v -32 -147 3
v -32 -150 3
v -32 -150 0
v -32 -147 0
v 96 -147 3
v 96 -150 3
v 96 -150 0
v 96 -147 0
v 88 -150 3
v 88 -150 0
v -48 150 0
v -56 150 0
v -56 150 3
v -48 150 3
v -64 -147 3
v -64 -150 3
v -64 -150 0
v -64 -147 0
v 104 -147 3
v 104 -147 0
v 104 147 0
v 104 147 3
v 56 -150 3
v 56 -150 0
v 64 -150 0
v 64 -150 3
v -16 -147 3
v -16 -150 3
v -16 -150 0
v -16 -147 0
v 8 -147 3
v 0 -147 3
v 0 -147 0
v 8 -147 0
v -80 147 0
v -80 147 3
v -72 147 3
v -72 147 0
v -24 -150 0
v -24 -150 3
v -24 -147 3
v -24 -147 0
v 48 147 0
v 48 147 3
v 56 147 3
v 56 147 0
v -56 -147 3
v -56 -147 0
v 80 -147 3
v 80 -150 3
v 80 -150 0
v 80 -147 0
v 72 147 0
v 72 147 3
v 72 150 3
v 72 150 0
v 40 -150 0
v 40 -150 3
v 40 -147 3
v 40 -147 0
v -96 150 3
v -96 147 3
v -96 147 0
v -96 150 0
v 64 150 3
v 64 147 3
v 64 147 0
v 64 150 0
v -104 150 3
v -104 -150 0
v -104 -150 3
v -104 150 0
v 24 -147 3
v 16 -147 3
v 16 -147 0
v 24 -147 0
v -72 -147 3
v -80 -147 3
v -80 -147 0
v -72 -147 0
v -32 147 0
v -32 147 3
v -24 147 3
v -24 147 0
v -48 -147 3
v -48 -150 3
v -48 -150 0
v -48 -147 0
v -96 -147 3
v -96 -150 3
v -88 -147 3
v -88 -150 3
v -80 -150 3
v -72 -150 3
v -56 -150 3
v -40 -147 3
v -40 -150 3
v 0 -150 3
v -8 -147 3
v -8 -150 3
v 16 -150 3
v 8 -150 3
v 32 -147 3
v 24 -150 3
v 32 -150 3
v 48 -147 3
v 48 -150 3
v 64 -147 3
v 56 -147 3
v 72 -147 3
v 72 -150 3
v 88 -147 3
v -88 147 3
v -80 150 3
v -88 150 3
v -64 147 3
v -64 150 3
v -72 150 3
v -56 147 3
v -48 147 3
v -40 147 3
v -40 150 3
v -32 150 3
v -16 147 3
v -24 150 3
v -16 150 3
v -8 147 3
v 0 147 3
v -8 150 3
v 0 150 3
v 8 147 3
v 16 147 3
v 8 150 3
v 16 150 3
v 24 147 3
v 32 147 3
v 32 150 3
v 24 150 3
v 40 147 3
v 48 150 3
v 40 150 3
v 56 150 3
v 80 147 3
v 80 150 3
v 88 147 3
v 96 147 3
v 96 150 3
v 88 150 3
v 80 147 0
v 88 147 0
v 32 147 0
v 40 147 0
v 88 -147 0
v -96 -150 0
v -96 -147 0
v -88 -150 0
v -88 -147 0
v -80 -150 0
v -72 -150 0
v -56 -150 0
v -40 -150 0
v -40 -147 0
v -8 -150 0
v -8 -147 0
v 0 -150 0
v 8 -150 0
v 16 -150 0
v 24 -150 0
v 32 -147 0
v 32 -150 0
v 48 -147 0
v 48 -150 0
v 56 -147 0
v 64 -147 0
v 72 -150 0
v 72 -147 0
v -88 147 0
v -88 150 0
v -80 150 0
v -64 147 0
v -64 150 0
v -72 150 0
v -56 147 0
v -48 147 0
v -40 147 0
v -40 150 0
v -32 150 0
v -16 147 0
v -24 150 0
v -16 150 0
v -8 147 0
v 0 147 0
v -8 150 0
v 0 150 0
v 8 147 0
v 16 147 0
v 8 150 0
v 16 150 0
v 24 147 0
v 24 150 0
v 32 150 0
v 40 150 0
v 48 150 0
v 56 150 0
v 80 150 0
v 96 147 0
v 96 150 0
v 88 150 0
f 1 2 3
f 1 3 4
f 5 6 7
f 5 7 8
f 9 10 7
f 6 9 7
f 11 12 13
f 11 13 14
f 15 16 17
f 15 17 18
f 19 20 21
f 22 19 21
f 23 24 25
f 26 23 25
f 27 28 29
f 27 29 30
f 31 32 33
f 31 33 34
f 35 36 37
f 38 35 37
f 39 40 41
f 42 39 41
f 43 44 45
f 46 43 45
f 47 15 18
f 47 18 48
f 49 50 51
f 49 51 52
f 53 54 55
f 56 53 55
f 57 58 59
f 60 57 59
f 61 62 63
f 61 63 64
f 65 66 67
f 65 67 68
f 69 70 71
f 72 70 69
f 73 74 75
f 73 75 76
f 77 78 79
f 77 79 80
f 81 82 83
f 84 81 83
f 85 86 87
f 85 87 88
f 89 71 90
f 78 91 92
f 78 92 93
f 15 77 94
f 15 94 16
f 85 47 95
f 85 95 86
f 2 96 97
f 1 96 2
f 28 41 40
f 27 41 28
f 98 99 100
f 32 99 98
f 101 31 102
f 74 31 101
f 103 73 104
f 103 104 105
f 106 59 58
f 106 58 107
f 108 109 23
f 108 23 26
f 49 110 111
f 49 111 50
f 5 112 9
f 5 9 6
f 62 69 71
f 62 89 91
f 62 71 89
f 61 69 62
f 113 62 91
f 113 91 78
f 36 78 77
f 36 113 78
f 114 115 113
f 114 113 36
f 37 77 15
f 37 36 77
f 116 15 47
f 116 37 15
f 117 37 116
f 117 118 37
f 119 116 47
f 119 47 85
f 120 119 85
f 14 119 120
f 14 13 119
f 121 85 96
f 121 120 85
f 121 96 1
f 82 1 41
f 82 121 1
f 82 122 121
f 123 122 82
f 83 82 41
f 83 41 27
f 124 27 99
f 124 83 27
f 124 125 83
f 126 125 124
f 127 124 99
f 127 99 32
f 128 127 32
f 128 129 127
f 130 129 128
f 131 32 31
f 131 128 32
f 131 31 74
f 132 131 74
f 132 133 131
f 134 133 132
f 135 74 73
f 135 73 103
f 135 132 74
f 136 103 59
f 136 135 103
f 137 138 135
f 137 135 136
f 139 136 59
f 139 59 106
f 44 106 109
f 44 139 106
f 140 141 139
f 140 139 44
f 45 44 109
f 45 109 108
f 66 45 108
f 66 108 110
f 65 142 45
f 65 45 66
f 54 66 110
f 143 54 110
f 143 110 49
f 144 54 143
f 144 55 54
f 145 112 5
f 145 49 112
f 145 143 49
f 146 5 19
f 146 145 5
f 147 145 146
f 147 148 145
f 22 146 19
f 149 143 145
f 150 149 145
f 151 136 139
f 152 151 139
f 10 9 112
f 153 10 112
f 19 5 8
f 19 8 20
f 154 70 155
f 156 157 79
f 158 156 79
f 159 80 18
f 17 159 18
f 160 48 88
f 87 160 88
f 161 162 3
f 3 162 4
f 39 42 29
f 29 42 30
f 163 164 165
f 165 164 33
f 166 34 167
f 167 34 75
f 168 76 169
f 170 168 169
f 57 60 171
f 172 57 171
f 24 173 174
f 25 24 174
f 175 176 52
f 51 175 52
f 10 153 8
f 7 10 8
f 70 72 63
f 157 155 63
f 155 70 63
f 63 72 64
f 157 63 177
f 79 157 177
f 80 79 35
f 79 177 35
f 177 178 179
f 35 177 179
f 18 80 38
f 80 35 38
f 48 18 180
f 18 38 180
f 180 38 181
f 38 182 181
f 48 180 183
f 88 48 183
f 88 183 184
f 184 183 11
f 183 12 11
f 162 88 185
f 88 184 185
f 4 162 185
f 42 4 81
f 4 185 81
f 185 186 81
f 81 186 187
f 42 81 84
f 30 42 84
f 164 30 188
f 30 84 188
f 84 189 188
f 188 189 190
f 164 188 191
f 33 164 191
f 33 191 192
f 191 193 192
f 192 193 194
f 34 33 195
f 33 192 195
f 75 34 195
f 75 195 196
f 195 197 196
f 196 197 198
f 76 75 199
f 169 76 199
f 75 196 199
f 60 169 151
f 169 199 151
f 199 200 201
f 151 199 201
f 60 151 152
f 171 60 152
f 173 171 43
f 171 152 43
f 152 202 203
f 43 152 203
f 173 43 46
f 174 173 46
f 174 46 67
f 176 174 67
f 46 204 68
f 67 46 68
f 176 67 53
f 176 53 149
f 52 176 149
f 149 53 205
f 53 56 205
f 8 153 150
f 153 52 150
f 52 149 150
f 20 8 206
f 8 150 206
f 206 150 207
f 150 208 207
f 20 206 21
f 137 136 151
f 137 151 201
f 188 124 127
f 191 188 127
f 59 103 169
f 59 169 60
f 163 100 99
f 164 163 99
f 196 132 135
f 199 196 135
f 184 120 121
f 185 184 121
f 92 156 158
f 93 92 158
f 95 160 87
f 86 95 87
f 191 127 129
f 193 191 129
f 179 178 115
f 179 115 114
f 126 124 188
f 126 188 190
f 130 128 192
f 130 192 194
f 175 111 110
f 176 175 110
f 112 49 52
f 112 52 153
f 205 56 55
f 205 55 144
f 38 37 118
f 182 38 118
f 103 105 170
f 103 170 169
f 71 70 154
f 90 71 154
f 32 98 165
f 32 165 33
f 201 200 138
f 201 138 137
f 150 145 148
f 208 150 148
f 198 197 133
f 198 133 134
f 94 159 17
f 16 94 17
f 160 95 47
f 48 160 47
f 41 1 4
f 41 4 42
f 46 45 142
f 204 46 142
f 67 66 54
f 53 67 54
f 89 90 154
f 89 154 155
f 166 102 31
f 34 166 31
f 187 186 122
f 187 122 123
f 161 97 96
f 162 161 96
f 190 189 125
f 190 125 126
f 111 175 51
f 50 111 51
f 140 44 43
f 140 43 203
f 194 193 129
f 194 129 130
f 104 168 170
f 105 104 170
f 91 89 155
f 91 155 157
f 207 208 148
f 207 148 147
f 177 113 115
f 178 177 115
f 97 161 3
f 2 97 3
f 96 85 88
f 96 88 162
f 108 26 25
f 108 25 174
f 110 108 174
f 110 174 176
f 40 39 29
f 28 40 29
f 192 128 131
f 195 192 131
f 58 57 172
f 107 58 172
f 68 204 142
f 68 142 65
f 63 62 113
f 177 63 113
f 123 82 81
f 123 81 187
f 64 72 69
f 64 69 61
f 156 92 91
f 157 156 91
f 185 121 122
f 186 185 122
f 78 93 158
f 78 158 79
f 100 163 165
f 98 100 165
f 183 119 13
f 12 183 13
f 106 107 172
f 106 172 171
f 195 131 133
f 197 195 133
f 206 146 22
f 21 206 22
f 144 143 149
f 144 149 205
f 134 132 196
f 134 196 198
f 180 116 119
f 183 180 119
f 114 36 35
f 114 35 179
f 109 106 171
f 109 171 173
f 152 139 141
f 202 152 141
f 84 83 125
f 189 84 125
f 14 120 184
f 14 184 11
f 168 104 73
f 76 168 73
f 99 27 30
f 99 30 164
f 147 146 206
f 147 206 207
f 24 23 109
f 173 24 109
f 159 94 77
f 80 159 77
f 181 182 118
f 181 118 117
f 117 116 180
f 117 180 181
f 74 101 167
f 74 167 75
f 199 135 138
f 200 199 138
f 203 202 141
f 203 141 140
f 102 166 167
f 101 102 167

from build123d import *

# Parameters (mm, degrees)
ESQUISSE1_W             = 208
ESQUISSE1_H             = 300
BOSS_EXTRU_1_DEPTH      = 3
ESQUISSE2_W             = 8
ESQUISSE2_H             = 3
ENL_V_MAT_EXTRU_1_DEPTH = 3


with BuildPart() as part:
    # Esquisse1 → Boss.-Extru.1 (new body)
    with BuildSketch(Plane.XY):
        Rectangle(ESQUISSE1_W, ESQUISSE1_H)
    extrude(amount=BOSS_EXTRU_1_DEPTH)

    # Esquisse2 → Enlèv. mat.-Extru.1 (cut)
    with BuildSketch(Plane.XY.offset(3)):
        with Locations((-92, 148.5)):
            Rectangle(ESQUISSE2_W, ESQUISSE2_H)
        with Locations((-76, 148.5)):
            Rectangle(ESQUISSE2_W, ESQUISSE2_H)
        with Locations((-60, 148.5)):
            Rectangle(ESQUISSE2_W, ESQUISSE2_H)
        with Locations((-44, 148.5)):
            Rectangle(ESQUISSE2_W, ESQUISSE2_H)
        with Locations((-28, 148.5)):
            Rectangle(ESQUISSE2_W, ESQUISSE2_H)
        with Locations((-12, 148.5)):
            Rectangle(ESQUISSE2_W, ESQUISSE2_H)
        with Locations((4, 148.5)):
            Rectangle(ESQUISSE2_W, ESQUISSE2_H)
        with Locations((20, 148.5)):
            Rectangle(ESQUISSE2_W, ESQUISSE2_H)
        with Locations((36, 148.5)):
            Rectangle(ESQUISSE2_W, ESQUISSE2_H)
        with Locations((52, 148.5)):
            Rectangle(ESQUISSE2_W, ESQUISSE2_H)
        with Locations((68, 148.5)):
            Rectangle(ESQUISSE2_W, ESQUISSE2_H)
        with Locations((84, 148.5)):
            Rectangle(ESQUISSE2_W, ESQUISSE2_H)
        with Locations((100, 148.5)):
            Rectangle(ESQUISSE2_W, ESQUISSE2_H)
        with Locations((100, -148.5)):
            Rectangle(ESQUISSE2_W, ESQUISSE2_H)
        with Locations((84, -148.5)):
            Rectangle(ESQUISSE2_W, ESQUISSE2_H)
        with Locations((68, -148.5)):
            Rectangle(ESQUISSE2_W, ESQUISSE2_H)
        with Locations((52, -148.5)):
            Rectangle(ESQUISSE2_W, ESQUISSE2_H)
        with Locations((36, -148.5)):
            Rectangle(ESQUISSE2_W, ESQUISSE2_H)
        with Locations((20, -148.5)):
            Rectangle(ESQUISSE2_W, ESQUISSE2_H)
        with Locations((4, -148.5)):
            Rectangle(ESQUISSE2_W, ESQUISSE2_H)
        with Locations((-12, -148.5)):
            Rectangle(ESQUISSE2_W, ESQUISSE2_H)
        with Locations((-28, -148.5)):
            Rectangle(ESQUISSE2_W, ESQUISSE2_H)
        with Locations((-44, -148.5)):
            Rectangle(ESQUISSE2_W, ESQUISSE2_H)
        with Locations((-60, -148.5)):
            Rectangle(ESQUISSE2_W, ESQUISSE2_H)
        with Locations((-76, -148.5)):
            Rectangle(ESQUISSE2_W, ESQUISSE2_H)
        with Locations((-92, -148.5)):
            Rectangle(ESQUISSE2_W, ESQUISSE2_H)
    extrude(amount=-ENL_V_MAT_EXTRU_1_DEPTH, mode=Mode.SUBTRACT)


solid = part.part
